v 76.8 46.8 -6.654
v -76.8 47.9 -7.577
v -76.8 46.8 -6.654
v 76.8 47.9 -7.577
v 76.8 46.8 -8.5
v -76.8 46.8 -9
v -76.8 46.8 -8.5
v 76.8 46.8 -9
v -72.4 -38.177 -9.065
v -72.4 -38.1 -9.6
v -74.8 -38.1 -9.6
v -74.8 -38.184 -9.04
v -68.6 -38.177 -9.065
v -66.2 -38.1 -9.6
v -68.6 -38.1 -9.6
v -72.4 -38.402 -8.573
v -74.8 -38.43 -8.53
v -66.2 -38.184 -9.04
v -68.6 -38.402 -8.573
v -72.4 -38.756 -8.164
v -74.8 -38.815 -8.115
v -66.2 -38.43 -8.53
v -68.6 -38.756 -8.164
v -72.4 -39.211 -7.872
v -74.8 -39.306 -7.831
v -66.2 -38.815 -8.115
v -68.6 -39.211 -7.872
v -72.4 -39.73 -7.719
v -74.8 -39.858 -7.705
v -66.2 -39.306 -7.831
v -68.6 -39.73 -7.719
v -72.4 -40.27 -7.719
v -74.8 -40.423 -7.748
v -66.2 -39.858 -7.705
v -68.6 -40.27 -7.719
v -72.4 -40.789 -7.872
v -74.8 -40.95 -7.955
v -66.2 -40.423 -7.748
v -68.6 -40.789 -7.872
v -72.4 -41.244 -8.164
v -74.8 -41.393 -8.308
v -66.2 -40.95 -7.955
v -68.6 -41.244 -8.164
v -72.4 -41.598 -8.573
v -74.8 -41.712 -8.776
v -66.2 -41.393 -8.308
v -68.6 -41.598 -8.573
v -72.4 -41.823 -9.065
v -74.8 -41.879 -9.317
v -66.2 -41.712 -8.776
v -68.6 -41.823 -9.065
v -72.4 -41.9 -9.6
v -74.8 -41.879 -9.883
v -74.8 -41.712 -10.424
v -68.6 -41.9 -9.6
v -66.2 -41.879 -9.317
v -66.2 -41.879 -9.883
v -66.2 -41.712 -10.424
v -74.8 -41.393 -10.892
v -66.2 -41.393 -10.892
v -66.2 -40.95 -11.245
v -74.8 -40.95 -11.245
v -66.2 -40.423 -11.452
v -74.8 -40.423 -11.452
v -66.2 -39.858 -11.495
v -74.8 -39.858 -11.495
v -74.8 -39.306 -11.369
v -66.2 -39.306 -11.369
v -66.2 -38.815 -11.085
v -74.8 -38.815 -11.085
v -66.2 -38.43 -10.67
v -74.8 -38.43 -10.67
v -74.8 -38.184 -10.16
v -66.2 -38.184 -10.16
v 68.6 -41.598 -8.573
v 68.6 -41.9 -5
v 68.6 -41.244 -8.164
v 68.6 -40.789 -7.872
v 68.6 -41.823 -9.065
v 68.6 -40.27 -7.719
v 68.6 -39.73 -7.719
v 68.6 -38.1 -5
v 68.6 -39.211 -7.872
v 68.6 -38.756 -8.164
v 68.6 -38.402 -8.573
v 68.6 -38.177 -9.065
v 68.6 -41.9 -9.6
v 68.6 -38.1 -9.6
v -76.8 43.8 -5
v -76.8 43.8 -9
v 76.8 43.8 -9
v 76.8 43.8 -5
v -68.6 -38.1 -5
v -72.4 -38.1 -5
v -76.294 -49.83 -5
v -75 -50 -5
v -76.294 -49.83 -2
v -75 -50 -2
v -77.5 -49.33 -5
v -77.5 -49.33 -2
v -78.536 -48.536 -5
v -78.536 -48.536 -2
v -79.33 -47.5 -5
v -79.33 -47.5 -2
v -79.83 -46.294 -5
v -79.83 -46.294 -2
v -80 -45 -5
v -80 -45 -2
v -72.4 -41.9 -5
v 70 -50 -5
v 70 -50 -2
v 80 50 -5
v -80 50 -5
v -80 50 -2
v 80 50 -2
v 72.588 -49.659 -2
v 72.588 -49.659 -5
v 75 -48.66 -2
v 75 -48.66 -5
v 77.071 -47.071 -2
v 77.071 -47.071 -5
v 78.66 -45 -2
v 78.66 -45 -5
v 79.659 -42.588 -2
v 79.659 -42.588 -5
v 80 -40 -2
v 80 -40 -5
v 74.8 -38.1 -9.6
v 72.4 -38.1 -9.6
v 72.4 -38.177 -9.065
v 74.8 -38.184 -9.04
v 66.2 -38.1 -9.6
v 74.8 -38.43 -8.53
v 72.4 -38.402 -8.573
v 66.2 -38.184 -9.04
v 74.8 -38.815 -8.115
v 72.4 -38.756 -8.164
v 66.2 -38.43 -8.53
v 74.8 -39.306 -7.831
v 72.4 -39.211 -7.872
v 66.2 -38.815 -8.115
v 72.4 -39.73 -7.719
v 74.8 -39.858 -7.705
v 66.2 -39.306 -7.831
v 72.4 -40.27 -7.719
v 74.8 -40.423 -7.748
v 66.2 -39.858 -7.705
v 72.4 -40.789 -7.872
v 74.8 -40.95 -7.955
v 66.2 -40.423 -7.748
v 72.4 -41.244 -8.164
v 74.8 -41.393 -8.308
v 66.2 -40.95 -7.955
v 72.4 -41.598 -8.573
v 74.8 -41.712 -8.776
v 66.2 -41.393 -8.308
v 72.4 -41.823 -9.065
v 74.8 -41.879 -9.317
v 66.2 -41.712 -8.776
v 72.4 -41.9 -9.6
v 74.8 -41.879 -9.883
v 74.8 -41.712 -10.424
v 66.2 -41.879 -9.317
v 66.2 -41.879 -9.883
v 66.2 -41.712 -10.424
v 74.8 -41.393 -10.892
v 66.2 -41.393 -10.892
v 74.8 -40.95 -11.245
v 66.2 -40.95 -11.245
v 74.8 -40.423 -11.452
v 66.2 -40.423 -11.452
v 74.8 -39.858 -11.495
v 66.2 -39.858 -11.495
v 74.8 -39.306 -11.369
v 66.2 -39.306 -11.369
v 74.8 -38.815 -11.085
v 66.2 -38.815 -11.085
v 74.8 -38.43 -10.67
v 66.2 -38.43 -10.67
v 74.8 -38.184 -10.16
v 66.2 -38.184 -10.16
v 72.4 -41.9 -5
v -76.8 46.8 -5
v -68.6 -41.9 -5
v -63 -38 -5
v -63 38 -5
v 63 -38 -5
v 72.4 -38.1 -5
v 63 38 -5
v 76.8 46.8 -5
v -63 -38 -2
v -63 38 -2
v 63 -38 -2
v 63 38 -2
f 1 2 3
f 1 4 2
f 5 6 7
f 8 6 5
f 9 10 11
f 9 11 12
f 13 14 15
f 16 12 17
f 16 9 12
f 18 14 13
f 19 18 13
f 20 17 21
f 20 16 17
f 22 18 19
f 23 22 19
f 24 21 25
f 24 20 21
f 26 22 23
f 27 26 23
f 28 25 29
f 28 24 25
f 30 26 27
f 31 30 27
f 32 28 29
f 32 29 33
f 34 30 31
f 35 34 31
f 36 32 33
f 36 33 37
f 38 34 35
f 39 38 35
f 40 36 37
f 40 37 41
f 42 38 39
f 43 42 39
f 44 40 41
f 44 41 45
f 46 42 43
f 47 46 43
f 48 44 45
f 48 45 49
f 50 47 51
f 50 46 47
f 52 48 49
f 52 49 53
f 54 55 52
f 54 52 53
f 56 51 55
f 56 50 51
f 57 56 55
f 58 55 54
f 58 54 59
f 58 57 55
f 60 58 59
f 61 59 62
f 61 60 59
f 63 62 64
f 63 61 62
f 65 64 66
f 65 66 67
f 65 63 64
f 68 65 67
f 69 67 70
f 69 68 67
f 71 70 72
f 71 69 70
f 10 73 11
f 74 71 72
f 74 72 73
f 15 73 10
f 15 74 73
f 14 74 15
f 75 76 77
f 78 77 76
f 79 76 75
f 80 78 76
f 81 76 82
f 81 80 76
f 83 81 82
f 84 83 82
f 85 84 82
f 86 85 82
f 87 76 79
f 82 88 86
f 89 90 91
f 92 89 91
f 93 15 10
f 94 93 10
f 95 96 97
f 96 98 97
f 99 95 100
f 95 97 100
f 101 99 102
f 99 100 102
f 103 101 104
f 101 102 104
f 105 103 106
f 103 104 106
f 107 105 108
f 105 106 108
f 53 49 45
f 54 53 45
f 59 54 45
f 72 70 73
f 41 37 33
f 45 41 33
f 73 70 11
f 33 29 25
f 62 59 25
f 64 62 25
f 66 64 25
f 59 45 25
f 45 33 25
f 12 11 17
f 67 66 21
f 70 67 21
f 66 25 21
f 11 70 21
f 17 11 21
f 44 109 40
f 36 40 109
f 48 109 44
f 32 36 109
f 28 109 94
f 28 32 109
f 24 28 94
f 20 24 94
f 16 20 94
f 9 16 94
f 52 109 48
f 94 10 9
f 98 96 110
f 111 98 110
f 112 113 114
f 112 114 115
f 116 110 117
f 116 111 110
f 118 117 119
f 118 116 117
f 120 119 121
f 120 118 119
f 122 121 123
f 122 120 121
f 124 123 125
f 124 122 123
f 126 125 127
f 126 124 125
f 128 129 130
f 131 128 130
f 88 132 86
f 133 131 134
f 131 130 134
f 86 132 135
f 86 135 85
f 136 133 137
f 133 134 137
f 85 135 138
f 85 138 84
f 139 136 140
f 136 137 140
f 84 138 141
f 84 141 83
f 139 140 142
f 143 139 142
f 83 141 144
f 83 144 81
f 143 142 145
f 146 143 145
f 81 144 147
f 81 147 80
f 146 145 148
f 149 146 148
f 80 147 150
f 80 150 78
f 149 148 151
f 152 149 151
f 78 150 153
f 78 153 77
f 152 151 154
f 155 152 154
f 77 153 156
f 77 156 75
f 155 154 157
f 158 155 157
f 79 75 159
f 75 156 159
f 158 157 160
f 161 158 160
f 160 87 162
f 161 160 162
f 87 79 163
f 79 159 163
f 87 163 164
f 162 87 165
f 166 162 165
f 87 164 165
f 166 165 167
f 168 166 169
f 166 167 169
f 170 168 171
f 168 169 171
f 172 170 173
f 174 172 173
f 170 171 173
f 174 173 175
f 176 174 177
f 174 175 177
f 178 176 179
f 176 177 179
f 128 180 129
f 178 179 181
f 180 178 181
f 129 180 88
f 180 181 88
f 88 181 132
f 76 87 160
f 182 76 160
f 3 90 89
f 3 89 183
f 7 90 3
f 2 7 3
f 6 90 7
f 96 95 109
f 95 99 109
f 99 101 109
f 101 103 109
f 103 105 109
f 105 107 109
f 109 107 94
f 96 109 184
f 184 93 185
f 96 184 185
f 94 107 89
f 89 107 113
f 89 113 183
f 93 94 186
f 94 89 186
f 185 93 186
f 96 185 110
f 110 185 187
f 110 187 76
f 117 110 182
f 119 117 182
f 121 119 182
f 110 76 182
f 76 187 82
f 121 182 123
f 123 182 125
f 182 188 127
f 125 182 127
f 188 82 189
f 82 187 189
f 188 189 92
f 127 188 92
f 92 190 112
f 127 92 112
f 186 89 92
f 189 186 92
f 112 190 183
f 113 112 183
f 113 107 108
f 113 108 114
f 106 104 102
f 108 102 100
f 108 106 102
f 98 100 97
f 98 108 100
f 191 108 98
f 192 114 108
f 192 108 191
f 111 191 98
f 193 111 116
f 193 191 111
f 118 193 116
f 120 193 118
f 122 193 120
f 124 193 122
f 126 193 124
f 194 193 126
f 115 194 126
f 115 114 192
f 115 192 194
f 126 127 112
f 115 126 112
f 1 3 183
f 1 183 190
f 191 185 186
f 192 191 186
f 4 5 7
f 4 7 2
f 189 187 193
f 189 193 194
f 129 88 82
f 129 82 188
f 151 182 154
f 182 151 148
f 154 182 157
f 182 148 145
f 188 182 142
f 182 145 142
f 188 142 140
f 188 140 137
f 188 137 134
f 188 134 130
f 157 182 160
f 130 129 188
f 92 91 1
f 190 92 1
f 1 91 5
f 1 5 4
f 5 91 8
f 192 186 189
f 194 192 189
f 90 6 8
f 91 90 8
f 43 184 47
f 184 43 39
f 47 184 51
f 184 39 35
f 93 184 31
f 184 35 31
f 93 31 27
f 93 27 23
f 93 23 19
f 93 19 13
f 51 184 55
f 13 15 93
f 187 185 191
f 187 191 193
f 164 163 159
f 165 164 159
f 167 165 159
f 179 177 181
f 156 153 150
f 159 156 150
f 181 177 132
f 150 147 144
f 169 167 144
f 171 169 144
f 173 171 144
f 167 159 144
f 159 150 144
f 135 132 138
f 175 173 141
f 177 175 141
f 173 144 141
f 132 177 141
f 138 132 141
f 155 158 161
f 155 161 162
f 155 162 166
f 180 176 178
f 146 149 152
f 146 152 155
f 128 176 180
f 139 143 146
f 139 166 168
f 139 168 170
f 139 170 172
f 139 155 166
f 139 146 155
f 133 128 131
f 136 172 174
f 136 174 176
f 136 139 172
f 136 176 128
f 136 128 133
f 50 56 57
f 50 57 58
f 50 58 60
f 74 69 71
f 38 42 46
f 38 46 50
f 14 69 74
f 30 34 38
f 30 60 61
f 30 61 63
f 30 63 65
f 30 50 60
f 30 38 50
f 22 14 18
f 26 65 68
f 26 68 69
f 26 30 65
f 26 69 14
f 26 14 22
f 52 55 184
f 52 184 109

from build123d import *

# Parameters (mm, degrees)
BOX_W             = 160
BOX_H             = 100
BOX_DEPTH         = 3
BOX001_W          = 126
BOX001_H          = 76
BOX001_DEPTH      = 5
BOX023_W          = 153.6
BOX023_H          = 3
BOX023_DEPTH      = 4
BOX024_W          = 3.8
BOX024_H          = 3.8
BOX024_DEPTH      = 4.6
CYLINDER012_R     = 1.9
CYLINDER012_DEPTH = 8.6
FILLET_R          = 10
FILLET015_R       = 5
PAD021_DEPTH      = 76.8


with BuildPart() as part:
    # Box → Box (join)
    with BuildSketch(Plane(origin=(-80, -50, -5), x_dir=(1, 0, 0), z_dir=(0, 0, 1))):
        with Locations((80, 50)):
            Rectangle(BOX_W, BOX_H)
    extrude(amount=BOX_DEPTH)

    # Box001 → Box001 (cut)
    with BuildSketch(Plane(origin=(-63, -38, -6), x_dir=(1, 0, 0), z_dir=(0, 0, 1))):
        with Locations((63, 38)):
            Rectangle(BOX001_W, BOX001_H)
    extrude(amount=BOX001_DEPTH, mode=Mode.SUBTRACT)

    # Box023 → Box023 (join)
    with BuildSketch(Plane(origin=(-76.8, 43.8, -9), x_dir=(1, 0, 0), z_dir=(0, 0, 1))):
        with Locations((76.8, 1.5)):
            Rectangle(BOX023_W, BOX023_H)
    extrude(amount=BOX023_DEPTH)

    # Box024 → Box024 (join)
    with BuildSketch(Plane(origin=(68.6, -41.9, -9.6), x_dir=(1, 0, 0), z_dir=(0, 0, 1))):
        with Locations((1.9, 1.9)):
            Rectangle(BOX024_W, BOX024_H)
    box024 = extrude(amount=BOX024_DEPTH)

    # Cylinder012 → Cylinder012 (join)
    with BuildSketch(Plane(origin=(66.2, -40, -9.6), x_dir=(0, 1, 0), z_dir=(1, 0, 0))):
        Circle(CYLINDER012_R)
    cylinder012 = extrude(amount=CYLINDER012_DEPTH)

    # Mirrored006: Box024, Cylinder012 across YZ
    add(box024.mirror(Plane.YZ))
    add(cylinder012.mirror(Plane.YZ))

    # Fillet
    fillet_edges = [part.edges().sort_by_distance(p)[0] for p in [
        (80, -50, -3.5),
    ]]
    fillet(fillet_edges, radius=FILLET_R)

    # Fillet015
    fillet015_edges = [part.edges().sort_by_distance(p)[0] for p in [
        (-80, -50, -3.5),
    ]]
    fillet(fillet015_edges, radius=FILLET015_R)

    # Sketch038 → Pad021 (join, symmetric)
    with BuildSketch(Plane.YZ):
        Polygon((46.8, -6.653981), (46.8, -8.5), (47.9, -7.57699), align=None)
    extrude(amount=PAD021_DEPTH, both=True)


solid = part.part
